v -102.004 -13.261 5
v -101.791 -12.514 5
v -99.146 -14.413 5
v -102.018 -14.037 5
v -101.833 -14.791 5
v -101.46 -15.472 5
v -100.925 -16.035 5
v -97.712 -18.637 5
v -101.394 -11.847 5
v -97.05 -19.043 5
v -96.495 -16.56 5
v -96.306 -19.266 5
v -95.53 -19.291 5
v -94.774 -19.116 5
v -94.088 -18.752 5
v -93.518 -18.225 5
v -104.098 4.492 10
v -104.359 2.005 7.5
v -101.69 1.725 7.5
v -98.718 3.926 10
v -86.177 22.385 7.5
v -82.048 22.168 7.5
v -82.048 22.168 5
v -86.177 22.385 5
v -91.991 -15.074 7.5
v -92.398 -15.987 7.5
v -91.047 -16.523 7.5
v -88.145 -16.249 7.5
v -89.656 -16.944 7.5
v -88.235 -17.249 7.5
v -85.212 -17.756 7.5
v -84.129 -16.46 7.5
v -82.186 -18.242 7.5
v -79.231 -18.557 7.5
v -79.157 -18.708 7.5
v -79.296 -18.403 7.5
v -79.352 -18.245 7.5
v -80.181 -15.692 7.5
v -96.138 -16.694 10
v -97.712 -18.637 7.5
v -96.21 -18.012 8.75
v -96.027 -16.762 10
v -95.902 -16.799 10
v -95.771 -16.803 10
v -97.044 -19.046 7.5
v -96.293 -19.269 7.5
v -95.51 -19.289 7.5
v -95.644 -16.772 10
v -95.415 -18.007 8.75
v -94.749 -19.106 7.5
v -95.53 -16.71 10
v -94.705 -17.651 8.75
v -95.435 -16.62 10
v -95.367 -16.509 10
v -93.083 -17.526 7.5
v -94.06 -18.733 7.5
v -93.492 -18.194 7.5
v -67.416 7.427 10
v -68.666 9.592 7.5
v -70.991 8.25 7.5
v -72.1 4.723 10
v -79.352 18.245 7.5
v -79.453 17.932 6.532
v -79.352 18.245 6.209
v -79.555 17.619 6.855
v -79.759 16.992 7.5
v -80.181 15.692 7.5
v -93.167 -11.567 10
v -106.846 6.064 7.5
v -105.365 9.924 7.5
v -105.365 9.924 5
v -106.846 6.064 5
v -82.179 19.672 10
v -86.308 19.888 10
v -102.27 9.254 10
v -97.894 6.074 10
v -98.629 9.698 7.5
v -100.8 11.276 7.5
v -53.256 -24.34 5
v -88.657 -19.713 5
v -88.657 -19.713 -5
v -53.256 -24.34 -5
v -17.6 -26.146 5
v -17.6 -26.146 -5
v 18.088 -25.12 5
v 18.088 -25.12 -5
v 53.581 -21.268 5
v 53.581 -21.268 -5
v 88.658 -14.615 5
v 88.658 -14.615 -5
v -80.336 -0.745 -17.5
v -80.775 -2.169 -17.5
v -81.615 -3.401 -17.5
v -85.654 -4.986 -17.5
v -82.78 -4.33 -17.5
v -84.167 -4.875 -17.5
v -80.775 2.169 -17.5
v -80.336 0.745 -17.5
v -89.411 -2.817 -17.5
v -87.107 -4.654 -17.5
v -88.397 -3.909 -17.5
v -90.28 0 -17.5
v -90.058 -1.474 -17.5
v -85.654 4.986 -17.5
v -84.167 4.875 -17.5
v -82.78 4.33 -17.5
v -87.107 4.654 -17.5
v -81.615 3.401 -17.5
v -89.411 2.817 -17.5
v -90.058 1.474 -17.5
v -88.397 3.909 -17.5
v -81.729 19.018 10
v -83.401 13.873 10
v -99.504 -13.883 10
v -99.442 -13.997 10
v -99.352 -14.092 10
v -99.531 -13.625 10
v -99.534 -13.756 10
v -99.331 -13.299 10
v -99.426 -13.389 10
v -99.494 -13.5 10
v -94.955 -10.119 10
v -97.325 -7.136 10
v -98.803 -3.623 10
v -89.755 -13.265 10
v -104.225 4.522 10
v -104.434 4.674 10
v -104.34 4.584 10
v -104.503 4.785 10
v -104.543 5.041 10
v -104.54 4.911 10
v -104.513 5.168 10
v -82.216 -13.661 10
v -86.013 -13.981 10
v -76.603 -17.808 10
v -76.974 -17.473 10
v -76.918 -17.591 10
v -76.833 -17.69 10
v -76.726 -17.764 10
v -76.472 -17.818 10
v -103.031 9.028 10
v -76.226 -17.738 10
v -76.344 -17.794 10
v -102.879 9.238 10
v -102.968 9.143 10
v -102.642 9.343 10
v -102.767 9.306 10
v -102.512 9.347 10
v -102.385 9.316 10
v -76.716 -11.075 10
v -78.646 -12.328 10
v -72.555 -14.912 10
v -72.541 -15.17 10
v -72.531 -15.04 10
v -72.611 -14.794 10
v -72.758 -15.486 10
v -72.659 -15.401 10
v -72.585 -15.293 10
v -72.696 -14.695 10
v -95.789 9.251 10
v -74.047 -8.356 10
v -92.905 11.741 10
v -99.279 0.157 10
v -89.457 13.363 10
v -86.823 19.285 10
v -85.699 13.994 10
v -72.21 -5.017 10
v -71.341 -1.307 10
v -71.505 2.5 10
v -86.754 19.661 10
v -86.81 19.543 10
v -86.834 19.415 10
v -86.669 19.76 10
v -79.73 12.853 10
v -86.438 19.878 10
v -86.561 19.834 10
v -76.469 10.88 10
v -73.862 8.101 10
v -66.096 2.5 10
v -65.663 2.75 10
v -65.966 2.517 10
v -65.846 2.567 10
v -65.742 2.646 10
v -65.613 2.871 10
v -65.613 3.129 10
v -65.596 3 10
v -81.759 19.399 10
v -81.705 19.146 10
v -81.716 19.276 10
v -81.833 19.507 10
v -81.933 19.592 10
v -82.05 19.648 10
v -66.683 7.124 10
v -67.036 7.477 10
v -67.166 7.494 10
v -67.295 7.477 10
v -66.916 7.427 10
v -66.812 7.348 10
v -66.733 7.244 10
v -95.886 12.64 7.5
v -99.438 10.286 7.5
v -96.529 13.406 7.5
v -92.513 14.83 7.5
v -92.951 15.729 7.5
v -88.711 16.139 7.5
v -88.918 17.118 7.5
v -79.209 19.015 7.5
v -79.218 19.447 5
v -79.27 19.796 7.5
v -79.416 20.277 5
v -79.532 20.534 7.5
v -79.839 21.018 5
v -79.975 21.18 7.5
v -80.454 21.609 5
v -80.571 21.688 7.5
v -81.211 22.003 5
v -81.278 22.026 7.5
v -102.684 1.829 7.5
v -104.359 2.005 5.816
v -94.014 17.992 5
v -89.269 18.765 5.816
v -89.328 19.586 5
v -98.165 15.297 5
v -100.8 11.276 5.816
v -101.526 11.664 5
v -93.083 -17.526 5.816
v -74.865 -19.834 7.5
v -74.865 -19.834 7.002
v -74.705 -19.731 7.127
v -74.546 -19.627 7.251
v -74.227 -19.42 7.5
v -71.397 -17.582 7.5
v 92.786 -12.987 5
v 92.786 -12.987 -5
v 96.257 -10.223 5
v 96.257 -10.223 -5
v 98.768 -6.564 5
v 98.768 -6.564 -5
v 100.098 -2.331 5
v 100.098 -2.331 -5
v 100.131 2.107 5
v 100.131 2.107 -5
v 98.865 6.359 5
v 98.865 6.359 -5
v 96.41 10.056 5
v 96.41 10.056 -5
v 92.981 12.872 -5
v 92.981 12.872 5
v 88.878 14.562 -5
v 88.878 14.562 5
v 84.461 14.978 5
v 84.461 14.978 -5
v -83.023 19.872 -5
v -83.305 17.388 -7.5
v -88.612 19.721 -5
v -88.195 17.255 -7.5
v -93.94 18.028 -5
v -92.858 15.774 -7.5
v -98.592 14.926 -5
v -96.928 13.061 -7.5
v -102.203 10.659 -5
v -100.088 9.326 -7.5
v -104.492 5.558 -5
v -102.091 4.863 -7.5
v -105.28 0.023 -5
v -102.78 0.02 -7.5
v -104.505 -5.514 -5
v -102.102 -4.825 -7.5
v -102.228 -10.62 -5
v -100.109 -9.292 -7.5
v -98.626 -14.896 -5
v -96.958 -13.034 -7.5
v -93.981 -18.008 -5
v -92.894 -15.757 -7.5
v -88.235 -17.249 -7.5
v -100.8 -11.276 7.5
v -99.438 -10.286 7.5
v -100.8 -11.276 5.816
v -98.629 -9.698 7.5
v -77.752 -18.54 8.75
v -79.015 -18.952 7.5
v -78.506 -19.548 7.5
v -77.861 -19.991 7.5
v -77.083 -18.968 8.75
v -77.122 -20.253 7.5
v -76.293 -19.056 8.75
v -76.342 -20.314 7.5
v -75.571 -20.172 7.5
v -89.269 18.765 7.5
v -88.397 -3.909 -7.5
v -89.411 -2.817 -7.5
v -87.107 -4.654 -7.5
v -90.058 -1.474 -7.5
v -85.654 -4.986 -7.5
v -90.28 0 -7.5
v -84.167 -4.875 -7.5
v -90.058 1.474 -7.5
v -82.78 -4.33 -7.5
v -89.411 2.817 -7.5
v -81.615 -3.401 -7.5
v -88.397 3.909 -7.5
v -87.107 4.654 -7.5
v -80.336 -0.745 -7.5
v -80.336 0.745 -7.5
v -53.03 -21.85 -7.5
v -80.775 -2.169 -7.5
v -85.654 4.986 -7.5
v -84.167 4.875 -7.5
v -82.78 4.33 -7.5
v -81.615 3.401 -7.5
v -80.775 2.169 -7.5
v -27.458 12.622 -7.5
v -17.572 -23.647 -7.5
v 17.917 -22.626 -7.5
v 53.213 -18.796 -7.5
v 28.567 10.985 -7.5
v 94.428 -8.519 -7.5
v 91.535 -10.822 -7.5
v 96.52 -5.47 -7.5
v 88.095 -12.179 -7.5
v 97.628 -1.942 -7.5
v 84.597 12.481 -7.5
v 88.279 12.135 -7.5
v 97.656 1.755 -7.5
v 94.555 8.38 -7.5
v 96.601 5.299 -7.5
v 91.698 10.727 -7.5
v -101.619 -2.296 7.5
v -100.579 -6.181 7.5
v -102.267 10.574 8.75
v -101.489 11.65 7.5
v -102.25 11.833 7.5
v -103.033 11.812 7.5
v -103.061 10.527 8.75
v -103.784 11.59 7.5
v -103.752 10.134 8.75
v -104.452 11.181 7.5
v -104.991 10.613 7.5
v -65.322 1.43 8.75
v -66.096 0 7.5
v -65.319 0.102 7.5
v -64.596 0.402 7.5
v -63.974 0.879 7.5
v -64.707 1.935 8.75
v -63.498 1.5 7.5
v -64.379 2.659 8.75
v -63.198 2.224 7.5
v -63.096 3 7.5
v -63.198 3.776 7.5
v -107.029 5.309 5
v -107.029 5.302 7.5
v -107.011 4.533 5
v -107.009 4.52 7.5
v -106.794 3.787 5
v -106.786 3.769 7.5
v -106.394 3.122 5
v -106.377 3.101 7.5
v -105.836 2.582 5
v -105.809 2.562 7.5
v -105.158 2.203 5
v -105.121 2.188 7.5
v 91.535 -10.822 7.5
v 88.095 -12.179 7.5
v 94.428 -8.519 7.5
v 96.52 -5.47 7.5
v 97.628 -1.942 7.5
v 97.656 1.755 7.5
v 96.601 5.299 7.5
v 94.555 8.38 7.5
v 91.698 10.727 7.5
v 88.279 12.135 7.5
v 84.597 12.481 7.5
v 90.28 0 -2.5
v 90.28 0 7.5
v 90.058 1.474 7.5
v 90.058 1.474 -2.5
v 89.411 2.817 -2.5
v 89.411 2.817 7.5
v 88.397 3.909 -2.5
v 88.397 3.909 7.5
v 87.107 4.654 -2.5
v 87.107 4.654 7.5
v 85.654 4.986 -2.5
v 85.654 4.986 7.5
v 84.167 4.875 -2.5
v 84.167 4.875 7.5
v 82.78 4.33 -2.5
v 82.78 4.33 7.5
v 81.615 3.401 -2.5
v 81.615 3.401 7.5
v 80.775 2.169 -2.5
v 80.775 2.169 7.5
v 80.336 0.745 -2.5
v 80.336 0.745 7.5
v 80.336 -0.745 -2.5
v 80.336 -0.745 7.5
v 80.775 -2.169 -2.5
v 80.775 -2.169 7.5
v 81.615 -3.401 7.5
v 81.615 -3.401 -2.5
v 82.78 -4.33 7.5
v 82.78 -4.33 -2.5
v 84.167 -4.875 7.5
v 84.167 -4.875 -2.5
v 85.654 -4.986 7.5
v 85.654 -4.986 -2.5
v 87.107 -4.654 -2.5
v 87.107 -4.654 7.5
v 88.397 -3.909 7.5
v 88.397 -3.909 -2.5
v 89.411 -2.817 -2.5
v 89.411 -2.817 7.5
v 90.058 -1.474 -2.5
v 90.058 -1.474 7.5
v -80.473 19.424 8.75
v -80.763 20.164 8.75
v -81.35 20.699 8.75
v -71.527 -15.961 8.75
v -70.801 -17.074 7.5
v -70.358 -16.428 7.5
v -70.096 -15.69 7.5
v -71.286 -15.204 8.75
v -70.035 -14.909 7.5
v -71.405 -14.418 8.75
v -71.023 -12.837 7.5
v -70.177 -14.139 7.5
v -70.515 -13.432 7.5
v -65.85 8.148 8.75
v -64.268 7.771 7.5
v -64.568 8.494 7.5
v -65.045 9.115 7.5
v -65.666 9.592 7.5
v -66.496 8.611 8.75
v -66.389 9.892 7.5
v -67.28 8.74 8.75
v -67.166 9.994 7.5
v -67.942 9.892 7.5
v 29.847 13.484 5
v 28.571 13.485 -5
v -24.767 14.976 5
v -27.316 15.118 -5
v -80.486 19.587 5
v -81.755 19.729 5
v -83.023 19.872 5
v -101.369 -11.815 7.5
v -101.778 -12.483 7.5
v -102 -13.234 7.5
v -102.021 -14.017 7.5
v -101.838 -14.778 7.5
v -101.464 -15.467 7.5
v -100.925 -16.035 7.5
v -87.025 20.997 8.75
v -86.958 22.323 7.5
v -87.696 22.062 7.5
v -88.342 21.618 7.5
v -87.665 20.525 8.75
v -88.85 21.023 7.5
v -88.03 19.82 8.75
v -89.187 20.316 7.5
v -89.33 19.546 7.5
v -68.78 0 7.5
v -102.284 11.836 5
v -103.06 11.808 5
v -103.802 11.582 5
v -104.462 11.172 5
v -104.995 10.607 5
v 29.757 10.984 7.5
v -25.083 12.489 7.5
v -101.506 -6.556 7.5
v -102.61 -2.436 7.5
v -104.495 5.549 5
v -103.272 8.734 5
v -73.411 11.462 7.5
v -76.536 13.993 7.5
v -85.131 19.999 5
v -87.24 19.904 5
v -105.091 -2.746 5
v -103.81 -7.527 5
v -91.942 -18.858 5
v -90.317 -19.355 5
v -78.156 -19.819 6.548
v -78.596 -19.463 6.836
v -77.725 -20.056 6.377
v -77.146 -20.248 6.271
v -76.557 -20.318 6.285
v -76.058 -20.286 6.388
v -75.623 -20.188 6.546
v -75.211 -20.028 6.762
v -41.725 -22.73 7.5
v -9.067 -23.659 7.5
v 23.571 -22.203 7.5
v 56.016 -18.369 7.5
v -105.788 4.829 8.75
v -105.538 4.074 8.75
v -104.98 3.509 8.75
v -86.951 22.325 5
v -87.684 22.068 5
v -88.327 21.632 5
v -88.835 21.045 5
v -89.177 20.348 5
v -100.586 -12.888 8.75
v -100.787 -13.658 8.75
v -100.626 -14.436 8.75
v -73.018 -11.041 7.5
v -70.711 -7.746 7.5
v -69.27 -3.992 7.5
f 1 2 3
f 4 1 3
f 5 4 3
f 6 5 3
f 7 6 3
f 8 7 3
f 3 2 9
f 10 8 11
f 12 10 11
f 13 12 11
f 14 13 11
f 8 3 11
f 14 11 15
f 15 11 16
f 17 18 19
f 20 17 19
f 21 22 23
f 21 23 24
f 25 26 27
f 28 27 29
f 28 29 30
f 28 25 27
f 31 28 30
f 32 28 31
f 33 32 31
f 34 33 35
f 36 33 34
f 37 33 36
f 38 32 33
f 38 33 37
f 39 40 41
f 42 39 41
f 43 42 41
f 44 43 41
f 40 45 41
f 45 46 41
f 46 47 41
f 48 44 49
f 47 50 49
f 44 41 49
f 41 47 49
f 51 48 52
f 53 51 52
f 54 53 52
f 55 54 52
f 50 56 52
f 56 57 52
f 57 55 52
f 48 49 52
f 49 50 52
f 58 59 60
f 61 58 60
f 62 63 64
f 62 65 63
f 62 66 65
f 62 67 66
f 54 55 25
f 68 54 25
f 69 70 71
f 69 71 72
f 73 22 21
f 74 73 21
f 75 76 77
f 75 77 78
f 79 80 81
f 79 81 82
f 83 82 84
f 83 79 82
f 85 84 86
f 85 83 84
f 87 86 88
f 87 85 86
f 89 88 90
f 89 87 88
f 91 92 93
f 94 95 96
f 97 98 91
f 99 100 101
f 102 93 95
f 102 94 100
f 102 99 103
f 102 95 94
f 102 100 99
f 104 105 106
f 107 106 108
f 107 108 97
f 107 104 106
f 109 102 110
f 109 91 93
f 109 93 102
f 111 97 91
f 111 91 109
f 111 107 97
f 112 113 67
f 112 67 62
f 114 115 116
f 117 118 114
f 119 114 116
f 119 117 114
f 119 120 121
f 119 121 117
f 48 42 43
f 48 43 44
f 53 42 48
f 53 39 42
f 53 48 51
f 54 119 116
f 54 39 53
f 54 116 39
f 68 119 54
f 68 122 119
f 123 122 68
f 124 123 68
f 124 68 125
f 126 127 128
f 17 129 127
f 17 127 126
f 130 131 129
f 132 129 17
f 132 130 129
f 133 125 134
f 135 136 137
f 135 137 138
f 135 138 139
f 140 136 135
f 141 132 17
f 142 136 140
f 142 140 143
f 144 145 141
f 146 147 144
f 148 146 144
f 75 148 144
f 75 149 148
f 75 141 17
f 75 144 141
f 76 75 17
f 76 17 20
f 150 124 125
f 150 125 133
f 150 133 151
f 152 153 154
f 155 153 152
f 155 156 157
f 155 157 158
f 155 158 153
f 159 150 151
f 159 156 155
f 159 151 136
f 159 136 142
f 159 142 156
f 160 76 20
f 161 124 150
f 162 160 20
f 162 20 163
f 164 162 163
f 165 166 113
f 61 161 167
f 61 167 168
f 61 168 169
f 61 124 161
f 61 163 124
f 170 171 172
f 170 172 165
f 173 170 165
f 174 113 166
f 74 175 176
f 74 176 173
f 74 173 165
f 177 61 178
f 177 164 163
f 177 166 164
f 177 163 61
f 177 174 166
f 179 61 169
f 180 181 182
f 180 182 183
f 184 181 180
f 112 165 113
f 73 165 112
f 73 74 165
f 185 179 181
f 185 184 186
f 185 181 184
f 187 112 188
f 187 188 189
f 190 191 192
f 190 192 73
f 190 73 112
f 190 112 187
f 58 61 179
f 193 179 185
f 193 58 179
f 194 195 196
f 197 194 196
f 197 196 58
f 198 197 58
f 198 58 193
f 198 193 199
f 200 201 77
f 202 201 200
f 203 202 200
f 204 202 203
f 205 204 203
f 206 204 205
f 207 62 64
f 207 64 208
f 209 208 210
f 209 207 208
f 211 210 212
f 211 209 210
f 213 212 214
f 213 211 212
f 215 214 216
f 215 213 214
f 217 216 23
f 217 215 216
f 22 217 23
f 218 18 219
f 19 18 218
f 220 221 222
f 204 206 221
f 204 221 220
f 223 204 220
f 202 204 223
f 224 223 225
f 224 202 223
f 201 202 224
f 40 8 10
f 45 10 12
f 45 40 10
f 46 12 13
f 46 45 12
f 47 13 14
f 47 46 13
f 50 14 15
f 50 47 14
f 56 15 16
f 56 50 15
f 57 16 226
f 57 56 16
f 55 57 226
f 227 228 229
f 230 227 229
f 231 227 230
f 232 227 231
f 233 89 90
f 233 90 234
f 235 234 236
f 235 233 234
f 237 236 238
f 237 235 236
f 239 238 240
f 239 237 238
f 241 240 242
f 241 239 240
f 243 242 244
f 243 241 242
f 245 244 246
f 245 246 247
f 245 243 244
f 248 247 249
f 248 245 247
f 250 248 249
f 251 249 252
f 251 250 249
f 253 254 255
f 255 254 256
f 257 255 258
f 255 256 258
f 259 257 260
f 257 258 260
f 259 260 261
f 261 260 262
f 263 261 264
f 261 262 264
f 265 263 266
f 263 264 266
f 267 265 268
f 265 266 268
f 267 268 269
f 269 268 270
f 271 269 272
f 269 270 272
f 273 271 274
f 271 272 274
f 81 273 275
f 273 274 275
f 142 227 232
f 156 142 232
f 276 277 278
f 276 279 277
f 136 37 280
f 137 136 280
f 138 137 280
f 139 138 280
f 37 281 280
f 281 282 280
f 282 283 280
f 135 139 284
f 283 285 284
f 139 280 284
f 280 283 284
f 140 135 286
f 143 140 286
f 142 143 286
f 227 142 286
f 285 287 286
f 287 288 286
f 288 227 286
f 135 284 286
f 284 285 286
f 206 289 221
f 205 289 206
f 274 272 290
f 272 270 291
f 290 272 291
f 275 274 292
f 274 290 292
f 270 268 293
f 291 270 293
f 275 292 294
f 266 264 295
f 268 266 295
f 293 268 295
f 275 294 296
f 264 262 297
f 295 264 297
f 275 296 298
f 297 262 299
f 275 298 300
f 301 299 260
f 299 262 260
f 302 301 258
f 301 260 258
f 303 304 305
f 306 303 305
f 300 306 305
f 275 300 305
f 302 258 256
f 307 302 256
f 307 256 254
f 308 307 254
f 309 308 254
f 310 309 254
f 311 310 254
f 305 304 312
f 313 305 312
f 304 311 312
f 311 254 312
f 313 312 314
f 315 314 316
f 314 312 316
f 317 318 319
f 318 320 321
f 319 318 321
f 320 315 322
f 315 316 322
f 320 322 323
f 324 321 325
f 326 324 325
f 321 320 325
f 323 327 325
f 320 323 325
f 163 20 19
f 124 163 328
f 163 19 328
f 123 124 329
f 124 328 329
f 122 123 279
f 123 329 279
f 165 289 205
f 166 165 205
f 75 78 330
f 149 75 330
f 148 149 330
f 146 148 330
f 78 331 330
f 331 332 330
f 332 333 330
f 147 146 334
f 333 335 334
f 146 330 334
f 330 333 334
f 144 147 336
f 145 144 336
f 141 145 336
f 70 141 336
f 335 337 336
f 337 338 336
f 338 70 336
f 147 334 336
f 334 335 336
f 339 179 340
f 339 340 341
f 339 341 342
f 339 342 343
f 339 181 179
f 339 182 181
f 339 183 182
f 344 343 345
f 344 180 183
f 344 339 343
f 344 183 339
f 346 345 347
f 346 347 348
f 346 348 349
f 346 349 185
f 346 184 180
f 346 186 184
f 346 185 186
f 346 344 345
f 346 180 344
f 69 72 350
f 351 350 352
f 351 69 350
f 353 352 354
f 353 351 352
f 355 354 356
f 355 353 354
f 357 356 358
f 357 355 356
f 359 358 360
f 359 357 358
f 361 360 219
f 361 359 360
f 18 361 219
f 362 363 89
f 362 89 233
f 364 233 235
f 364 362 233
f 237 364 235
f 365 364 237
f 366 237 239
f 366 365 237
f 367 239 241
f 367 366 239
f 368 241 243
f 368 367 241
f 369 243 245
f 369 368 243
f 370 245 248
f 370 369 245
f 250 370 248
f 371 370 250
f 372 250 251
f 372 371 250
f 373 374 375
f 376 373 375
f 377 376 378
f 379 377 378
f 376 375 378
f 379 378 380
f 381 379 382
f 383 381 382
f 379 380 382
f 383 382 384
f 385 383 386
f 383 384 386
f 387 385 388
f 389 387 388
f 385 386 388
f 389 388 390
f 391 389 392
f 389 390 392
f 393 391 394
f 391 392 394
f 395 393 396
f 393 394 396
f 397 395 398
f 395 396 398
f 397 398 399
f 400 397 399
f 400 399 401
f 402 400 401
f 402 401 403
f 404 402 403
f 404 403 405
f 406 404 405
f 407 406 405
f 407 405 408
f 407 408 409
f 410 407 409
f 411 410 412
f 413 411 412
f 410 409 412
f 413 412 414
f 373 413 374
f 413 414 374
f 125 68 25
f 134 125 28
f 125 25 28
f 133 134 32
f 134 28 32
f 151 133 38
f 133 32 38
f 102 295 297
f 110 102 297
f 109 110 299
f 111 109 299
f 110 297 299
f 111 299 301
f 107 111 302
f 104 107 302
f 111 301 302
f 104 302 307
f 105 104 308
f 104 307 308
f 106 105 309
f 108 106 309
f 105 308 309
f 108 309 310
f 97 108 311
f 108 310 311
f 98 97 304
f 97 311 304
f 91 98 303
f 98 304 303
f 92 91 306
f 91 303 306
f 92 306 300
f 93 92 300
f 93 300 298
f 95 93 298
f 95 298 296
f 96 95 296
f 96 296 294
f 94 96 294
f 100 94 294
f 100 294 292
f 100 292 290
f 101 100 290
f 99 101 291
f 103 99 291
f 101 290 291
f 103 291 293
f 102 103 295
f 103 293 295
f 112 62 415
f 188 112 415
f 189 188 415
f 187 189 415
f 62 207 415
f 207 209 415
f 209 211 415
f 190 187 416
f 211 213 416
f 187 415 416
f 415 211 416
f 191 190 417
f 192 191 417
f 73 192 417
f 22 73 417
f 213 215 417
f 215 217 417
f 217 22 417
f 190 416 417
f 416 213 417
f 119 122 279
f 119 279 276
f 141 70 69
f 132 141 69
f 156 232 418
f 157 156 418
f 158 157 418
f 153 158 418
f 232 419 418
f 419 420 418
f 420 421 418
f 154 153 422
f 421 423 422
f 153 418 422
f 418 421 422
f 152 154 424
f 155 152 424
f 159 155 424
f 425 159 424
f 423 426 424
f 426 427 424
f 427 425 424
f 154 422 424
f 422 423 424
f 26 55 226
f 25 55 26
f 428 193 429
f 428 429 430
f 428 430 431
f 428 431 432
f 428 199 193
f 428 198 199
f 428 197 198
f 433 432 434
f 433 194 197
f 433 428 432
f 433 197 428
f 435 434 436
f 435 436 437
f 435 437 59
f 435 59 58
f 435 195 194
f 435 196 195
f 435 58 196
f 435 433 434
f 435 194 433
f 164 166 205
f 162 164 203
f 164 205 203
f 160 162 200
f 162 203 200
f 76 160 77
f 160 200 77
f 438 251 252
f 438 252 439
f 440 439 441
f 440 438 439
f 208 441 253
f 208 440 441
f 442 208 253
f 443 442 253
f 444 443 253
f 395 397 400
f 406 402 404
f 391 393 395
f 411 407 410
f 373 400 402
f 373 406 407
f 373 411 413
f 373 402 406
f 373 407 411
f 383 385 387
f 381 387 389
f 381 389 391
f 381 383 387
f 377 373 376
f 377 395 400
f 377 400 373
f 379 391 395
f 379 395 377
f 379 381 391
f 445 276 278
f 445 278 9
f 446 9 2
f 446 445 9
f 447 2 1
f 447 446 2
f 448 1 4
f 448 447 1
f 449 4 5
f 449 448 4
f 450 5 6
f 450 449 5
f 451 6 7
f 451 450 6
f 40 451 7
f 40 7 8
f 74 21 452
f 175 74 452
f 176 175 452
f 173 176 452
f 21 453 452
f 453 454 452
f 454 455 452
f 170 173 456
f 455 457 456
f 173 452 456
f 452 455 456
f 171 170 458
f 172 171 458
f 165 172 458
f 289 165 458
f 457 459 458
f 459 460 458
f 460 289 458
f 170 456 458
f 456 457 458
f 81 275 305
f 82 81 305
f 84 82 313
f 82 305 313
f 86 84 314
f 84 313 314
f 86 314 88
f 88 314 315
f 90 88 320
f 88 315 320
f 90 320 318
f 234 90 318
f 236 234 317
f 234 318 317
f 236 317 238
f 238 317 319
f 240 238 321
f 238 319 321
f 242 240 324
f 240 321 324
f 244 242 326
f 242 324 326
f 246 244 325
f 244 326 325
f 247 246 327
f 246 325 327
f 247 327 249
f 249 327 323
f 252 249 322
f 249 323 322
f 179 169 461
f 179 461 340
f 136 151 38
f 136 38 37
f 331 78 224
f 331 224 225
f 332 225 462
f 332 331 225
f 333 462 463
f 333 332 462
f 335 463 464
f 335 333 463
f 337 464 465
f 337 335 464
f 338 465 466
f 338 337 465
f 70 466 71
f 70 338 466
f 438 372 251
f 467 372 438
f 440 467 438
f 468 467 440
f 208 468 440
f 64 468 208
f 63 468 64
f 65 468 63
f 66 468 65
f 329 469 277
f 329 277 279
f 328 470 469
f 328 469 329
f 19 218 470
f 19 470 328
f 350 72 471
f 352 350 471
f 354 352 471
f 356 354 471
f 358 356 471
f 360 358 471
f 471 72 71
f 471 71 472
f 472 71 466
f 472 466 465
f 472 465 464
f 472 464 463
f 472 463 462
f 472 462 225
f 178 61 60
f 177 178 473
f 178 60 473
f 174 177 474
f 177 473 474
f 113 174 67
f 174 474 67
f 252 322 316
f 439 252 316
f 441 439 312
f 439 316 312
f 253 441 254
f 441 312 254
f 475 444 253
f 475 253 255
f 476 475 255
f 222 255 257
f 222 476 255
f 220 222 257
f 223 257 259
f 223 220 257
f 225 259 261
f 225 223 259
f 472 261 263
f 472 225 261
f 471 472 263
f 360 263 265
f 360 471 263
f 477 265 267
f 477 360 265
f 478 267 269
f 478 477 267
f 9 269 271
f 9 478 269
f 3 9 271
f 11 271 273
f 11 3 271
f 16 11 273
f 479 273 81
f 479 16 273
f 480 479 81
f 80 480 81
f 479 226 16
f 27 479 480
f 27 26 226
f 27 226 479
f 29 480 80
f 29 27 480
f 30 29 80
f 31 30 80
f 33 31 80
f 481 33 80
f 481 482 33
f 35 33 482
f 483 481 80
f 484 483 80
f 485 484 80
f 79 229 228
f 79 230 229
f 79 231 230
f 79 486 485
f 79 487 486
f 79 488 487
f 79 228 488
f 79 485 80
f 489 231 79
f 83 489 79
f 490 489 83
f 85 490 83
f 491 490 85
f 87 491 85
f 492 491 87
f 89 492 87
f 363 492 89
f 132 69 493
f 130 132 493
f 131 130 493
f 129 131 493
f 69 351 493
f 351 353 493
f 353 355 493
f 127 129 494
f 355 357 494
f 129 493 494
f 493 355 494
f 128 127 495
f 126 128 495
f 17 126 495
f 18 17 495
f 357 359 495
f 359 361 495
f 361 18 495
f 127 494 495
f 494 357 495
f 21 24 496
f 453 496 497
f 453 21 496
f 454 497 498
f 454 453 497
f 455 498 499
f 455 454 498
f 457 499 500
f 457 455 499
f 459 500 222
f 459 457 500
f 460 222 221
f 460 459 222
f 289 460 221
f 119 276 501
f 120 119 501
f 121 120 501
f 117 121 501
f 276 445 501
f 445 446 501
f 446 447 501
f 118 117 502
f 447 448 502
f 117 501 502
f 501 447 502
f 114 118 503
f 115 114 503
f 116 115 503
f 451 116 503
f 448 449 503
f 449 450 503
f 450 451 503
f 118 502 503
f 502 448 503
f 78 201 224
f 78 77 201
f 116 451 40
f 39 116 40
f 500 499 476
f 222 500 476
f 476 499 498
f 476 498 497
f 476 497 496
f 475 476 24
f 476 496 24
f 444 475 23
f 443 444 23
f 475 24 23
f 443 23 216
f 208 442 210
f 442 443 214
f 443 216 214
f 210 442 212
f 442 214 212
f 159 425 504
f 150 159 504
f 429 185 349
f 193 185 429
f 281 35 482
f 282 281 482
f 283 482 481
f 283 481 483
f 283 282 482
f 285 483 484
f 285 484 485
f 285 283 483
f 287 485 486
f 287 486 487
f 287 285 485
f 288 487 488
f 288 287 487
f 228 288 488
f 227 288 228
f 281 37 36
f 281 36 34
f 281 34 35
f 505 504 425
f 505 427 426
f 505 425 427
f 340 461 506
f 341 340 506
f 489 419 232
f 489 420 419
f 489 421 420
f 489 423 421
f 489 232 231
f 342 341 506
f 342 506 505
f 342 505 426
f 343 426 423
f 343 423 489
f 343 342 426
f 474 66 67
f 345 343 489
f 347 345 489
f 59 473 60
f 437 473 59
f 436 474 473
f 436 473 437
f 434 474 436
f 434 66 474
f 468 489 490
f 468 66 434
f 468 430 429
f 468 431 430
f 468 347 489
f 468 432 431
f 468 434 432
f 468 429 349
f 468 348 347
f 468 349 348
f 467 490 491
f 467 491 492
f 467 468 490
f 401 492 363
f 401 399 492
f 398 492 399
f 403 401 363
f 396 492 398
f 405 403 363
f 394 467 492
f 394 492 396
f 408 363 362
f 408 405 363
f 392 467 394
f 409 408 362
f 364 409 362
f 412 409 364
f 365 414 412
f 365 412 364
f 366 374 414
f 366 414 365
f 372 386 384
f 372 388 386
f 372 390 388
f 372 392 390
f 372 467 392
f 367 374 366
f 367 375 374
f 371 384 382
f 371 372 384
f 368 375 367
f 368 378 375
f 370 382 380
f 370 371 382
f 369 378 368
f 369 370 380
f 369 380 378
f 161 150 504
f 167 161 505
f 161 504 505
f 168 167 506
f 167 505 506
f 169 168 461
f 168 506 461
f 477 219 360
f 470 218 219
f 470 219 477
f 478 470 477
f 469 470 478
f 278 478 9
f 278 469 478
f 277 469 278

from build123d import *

# Parameters (mm, degrees)
BOSS_EXTRUDE2_DEPTH = 7.5
CHAMFER1_SIZE       = 2.5
SKETCH4_R           = 16.5
BOSS_EXTRUDE3_DEPTH = 2.5
BOSS_EXTRUDE4_DEPTH = 5
CHAMFER2_SIZE       = 2.5
SKETCH6_R           = 5
CUT_EXTRUDE1_DEPTH  = 10
SKETCH7_R           = 5
BOSS_EXTRUDE5_DEPTH = 10


with BuildPart() as part:
    # Sketch1 → Boss-Extrude2 (new, symmetric)
    with BuildSketch(Plane.XY):
        with BuildLine():
            ThreePointArc((84.460518945, 14.977598104), (0.616073919, 13.910903957), (-83.022979725, 19.872238008))
            ThreePointArc((-83.022979725, 19.872238008), (-105.080474764, 2.818038301), (-88.656802688, -19.712869593))
            ThreePointArc((-88.656802688, -19.712869593), (0.254242747, -25.987416271), (88.657894096, -14.614713664))
            ThreePointArc((88.657894096, -14.614713664), (100.131353297, 2.106516275), (84.460518945, 14.977598104))
        make_face()
    extrude(amount=BOSS_EXTRUDE2_DEPTH, both=True)

    # Chamfer1
    chamfer1_edges = [part.edges().sort_by_distance(p)[0] for p in [
        (100.131353297, 2.106516275, 7.5),
        (0.616073919, 13.910903957, 7.5),
        (-105.080474764, 2.818038301, 7.5),
        (0.254242747, -25.987416271, 7.5),
        (-105.080474764, 2.818038301, -7.5),
        (0.616073919, 13.910903957, -7.5),
        (100.131353297, 2.106516275, -7.5),
        (0.254242747, -25.987416271, -7.5),
    ]]
    chamfer(chamfer1_edges, length=CHAMFER1_SIZE)

    # Sketch4 → Boss-Extrude3 (add, symmetric)
    with BuildSketch(Plane.XY.offset(7.5)):
        with Locations((-85.280003554, 0)):
            Circle(SKETCH4_R)
    extrude(amount=BOSS_EXTRUDE3_DEPTH, both=True)

    # Sketch5 → Boss-Extrude4 (add)
    with BuildSketch(Plane.XY.offset(10)):
        with BuildLine():
            Line((-68.665882393, 9.592167325), (-85.280003554, 0))
            Line((-85.280003554, 0), (-66.095668905, 0))
            ThreePointArc((-66.095668905, 0), (-63.715608884, 1.173715713), (-63.197891426, 3.776457135))
            Line((-63.197891426, 3.776457135), (-64.268104914, 7.770548248))
            ThreePointArc((-64.268104914, 7.770548248), (-66.017832096, 9.765729711), (-68.665882393, 9.592167325))
        make_face()
        with BuildLine():
            Line((-71.023264529, -12.836825476), (-85.280003554, 0))
            Line((-85.280003554, 0), (-79.351718121, -18.245386479))
            ThreePointArc((-79.351718121, -18.245386479), (-77.49996915, -20.146259969), (-74.864631467, -19.834347199))
            Line((-74.864631467, -19.834347199), (-71.396739243, -17.582271657))
            ThreePointArc((-71.396739243, -17.582271657), (-70.039904347, -15.30163724), (-71.023264529, -12.836825476))
        make_face()
        with BuildLine():
            Line((-93.082975429, -17.525761777), (-85.280003554, 0))
            Line((-85.280003554, 0), (-100.800456311, -11.276268982))
            ThreePointArc((-100.800456311, -11.276268982), (-102.036072529, -13.62478912), (-100.925061727, -16.034757849))
            Line((-100.925061727, -16.034757849), (-97.711572975, -18.636989732))
            ThreePointArc((-97.711572975, -18.636989732), (-95.12327571, -19.222661609), (-93.082975429, -17.525761777))
        make_face()
        with BuildLine():
            Line((-104.35924441, 2.00530902), (-85.280003554, 0))
            Line((-85.280003554, 0), (-100.800456311, 11.276268982))
            ThreePointArc((-100.800456311, 11.276268982), (-103.415858102, 11.725677203), (-105.364553347, 9.924321847))
            Line((-105.364553347, 9.924321847), (-106.8464003, 6.063978554))
            ThreePointArc((-106.8464003, 6.063978554), (-106.603579514, 3.421379012), (-104.35924441, 2.00530902))
        make_face()
        with BuildLine():
            Line((-89.268651008, 18.765110909), (-85.280003554, 0))
            Line((-85.280003554, 0), (-79.351718121, 18.245386479))
            ThreePointArc((-79.351718121, 18.245386479), (-79.732509104, 20.871656173), (-82.047879802, 22.168326066))
            Line((-82.047879802, 22.168326066), (-86.177200337, 22.384734585))
            ThreePointArc((-86.177200337, 22.384734585), (-88.615426102, 21.337190126), (-89.268651008, 18.765110909))
        make_face()
    extrude(amount=-BOSS_EXTRUDE4_DEPTH)

    # Chamfer2
    chamfer2_edges = [part.edges().sort_by_distance(p)[0] for p in [
        (-69.828233392, 8.921083662, 10),
        (-66.017832096, 9.765729711, 10),
        (-63.73299817, 5.773502692, 10),
        (-63.715608884, 1.173715713, 10),
        (-67.437836229, 0, 10),
        (-69.875926517, -5.913071167, 10),
        (-72.020689231, -11.938740241, 10),
        (-70.039904347, -15.30163724, 10),
        (-73.130685355, -18.708309428, 10),
        (-77.49996915, -20.146259969, 10),
        (-79.766470634, -16.968909499, 10),
        (-86.143546832, -16.477387323, 10),
        (-92.537066797, -16.299630914, 10),
        (-95.12327571, -19.222661609, 10),
        (-99.318317351, -17.33587379, 10),
        (-102.036072529, -13.62478912, 10),
        (-99.714620136, -10.487362822, 10),
        (-101.217779688, -4.270514244, 10),
        (-103.024429619, 1.865014332, 10),
        (-106.603579514, 3.421379012, 10),
        (-106.105476824, 7.994150201, 10),
        (-103.415858102, 11.725677203, 10),
        (-99.714620136, 10.487362822, 10),
        (-94.266547632, 13.838064371, 10),
        (-88.98959873, 17.45227316, 10),
        (-88.615426102, 21.337190126, 10),
        (-84.112540069, 22.276530326, 10),
        (-79.732509104, 20.871656173, 10),
        (-79.766470634, 16.968909499, 10),
        (-74.896217101, 12.822908364, 10),
    ]]
    chamfer(chamfer2_edges, length=CHAMFER2_SIZE - 0.0001)  # a hair under: the kernel refuses the full size

    # Sketch6 → Cut-Extrude1 (cut)
    with BuildSketch(Plane.XY.offset(7.5)):
        with Locations((85.280003554, 0)):
            Circle(SKETCH6_R)
    extrude(amount=-CUT_EXTRUDE1_DEPTH, mode=Mode.SUBTRACT)

    # Sketch7 → Boss-Extrude5 (add)
    with BuildSketch(Plane(origin=(0, 0, -7.5), x_dir=(-1, 0, 0), z_dir=(0, 0, -1))):
        with Locations((85.280003554, 0)):
            Circle(SKETCH7_R)
    extrude(amount=BOSS_EXTRUDE5_DEPTH)


solid = part.part
